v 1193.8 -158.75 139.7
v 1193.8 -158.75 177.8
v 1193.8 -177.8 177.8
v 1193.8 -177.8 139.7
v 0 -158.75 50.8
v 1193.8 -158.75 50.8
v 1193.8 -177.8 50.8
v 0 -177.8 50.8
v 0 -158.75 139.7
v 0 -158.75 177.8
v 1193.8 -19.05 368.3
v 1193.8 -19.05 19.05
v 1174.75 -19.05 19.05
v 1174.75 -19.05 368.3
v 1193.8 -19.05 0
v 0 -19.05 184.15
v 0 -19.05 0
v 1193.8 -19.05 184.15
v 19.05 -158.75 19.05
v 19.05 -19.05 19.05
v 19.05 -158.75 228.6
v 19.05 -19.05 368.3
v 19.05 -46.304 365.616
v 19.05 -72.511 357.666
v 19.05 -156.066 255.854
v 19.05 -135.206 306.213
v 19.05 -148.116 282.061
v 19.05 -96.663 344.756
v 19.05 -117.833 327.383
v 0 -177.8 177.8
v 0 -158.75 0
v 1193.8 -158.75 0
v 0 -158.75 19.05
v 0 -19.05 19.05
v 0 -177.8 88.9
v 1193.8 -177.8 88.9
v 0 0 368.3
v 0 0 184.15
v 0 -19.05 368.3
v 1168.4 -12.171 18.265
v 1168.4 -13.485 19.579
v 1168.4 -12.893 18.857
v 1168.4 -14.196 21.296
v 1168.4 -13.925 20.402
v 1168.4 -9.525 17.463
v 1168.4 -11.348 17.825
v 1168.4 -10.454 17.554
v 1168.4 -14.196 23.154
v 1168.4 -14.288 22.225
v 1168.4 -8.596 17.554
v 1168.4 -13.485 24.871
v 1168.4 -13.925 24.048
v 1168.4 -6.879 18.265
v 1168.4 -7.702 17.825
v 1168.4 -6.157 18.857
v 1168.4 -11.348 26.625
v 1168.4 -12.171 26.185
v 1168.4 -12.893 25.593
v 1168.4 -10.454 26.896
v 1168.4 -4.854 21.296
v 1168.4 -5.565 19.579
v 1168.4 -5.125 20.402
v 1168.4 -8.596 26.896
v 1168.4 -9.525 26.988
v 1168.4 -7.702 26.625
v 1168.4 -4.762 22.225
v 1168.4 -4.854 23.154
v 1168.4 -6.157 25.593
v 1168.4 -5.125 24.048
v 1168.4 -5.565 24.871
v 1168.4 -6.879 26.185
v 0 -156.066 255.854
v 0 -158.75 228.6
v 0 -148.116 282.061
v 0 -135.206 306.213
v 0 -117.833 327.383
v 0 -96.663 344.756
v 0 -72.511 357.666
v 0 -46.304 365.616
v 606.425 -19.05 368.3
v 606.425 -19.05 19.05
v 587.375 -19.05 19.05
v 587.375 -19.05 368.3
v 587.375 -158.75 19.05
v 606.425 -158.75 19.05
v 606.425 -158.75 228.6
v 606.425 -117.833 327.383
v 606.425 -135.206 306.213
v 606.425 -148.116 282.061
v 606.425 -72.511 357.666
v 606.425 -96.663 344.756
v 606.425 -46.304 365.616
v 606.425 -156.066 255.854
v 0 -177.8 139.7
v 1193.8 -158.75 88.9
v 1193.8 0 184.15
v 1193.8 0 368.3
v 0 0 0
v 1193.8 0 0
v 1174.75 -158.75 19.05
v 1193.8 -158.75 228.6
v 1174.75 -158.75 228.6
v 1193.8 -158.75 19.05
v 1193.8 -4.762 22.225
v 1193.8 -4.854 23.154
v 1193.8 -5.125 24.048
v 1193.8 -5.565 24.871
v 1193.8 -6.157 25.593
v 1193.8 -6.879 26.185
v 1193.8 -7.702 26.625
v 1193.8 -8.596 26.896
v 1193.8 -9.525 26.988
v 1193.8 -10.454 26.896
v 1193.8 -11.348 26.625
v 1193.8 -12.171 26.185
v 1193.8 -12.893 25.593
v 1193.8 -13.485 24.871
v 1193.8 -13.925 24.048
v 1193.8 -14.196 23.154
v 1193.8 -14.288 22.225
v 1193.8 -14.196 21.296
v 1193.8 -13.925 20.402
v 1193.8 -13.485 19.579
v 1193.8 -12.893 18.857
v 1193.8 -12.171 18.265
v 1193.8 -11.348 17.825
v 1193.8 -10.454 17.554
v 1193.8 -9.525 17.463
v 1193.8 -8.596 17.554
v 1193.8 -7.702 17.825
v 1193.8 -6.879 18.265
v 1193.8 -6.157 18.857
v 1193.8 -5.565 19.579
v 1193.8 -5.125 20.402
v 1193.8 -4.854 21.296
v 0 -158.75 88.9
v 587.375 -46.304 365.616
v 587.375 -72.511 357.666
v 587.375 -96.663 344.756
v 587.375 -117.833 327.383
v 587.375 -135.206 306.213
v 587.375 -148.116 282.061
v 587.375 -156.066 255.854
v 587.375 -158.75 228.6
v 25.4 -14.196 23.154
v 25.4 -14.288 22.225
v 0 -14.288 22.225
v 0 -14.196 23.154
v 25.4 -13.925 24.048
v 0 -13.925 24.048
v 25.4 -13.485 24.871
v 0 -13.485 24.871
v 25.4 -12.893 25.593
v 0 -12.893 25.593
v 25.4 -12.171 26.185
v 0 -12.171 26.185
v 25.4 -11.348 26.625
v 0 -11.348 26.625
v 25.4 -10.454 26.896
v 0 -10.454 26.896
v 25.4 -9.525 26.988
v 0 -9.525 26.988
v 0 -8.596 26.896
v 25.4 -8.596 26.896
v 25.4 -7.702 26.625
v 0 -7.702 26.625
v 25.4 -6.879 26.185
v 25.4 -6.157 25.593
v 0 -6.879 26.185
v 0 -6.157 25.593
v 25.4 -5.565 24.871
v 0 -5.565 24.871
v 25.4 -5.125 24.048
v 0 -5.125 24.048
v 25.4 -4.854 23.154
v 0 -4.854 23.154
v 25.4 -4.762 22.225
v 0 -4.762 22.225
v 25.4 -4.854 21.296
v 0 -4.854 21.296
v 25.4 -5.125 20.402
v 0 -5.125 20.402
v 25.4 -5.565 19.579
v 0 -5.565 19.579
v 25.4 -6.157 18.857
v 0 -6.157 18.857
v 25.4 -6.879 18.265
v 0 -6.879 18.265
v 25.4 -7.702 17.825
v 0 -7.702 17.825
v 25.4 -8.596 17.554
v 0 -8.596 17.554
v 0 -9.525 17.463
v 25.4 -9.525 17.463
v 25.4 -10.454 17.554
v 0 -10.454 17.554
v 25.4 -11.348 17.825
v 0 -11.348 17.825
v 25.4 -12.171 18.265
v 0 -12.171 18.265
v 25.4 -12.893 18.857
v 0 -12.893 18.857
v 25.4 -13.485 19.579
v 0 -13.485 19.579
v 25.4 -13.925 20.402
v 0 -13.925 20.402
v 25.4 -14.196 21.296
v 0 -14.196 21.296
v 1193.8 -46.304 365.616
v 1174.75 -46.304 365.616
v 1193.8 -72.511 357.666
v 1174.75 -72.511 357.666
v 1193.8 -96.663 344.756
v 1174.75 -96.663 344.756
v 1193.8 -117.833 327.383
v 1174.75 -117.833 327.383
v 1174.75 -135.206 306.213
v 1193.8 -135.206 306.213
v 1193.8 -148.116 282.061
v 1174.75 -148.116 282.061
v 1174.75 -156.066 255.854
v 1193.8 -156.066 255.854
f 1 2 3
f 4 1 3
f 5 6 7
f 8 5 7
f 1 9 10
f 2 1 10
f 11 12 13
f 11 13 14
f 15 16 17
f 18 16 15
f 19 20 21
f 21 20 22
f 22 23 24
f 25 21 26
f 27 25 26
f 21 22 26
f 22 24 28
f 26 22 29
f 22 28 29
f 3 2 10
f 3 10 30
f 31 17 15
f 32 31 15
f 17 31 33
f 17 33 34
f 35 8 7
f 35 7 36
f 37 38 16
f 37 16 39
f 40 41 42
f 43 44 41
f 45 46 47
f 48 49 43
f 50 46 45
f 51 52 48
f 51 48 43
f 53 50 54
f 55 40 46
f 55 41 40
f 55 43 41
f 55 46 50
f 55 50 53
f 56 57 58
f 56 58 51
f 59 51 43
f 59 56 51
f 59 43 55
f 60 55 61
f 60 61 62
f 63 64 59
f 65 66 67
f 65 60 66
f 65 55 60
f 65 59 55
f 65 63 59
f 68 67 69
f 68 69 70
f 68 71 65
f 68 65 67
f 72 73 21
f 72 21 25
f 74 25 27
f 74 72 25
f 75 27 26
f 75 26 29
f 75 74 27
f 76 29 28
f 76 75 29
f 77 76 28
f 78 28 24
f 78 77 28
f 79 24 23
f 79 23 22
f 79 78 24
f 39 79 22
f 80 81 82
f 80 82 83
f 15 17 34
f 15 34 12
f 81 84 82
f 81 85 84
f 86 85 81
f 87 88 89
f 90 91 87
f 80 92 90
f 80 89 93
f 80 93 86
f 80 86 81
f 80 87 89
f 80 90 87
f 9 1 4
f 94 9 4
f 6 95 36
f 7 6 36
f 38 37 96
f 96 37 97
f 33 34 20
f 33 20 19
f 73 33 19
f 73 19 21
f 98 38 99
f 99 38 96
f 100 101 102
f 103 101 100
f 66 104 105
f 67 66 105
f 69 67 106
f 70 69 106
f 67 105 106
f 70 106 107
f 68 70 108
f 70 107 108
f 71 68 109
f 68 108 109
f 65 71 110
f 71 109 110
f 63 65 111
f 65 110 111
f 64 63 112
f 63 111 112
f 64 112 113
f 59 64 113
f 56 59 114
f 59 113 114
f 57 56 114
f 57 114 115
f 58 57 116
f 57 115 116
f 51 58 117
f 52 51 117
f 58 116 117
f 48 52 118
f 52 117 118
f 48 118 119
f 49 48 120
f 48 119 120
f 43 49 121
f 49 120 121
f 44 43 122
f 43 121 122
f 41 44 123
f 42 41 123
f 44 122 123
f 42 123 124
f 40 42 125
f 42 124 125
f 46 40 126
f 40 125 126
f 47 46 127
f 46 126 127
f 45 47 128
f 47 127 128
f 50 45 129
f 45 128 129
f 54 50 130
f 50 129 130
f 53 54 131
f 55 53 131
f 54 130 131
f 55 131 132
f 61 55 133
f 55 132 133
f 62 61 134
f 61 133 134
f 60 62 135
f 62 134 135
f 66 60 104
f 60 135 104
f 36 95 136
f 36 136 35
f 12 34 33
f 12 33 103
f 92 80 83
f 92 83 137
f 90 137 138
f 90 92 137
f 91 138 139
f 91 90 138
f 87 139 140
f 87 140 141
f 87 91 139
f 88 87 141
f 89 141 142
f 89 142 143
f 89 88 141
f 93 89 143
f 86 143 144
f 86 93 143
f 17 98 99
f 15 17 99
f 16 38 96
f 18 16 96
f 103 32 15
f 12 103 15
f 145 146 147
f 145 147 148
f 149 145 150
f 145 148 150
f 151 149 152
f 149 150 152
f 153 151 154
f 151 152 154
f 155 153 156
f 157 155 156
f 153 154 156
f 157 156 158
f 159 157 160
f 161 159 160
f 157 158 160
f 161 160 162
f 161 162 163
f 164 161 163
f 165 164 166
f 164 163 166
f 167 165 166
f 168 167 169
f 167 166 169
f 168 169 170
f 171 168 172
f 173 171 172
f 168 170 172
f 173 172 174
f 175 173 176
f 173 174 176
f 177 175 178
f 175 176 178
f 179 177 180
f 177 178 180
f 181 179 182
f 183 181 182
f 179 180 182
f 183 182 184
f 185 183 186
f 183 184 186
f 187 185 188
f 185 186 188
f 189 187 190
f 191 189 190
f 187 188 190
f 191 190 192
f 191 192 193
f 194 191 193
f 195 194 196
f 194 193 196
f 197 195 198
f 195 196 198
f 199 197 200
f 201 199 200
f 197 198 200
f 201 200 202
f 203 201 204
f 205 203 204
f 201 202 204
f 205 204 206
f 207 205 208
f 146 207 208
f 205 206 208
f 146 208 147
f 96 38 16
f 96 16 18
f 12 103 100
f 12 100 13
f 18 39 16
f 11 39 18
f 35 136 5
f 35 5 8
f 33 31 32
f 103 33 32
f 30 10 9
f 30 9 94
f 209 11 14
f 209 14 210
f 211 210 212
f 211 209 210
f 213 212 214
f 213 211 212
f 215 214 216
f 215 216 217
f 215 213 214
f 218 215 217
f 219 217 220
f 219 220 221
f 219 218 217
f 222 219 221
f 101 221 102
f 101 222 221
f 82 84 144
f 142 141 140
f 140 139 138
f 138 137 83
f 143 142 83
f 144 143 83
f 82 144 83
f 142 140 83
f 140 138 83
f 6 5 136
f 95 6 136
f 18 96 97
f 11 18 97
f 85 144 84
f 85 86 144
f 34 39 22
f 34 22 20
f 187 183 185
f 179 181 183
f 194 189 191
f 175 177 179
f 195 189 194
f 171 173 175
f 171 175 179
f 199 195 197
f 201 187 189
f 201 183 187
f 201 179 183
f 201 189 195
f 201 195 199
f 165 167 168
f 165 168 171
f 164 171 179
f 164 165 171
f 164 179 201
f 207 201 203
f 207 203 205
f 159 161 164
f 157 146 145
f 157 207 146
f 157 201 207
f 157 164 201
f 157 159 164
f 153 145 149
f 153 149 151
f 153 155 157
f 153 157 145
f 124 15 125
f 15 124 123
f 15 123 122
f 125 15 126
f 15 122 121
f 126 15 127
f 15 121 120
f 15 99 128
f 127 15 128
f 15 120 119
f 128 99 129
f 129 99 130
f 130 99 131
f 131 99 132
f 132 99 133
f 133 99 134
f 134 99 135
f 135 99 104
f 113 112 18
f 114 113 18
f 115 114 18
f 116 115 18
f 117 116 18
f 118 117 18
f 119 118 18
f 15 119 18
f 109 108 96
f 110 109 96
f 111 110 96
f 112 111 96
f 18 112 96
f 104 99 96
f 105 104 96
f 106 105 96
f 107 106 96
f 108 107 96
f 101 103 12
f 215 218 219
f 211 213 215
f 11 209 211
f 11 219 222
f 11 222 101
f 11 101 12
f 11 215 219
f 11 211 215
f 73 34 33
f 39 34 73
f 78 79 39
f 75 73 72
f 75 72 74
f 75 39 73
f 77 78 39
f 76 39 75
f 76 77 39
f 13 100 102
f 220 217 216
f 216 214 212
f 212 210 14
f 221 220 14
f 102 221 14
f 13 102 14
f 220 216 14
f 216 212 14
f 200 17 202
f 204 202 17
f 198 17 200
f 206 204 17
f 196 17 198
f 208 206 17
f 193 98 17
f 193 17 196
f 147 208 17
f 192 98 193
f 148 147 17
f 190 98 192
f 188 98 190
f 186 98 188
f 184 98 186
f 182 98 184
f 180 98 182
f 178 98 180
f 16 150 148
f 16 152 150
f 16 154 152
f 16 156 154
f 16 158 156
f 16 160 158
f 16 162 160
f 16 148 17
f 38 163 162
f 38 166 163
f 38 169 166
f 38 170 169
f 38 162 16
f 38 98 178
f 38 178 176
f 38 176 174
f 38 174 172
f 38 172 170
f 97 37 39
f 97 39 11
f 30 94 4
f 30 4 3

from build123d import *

# Parameters (mm, degrees)
F0_W      = 1193.8
F0_H      = 184.15
F1_DEPTH  = 19.05
F2_W      = 1193.8
F2_H      = 184.15
F3_DEPTH  = 19.05
F4_W      = 1193.8
F4_H      = 139.7
F5_DEPTH  = 19.05
F7_DEPTH  = 19.05
F9_DEPTH  = 19.05
F13_DEPTH = 9.525
F14_W     = 19.05
F14_H     = 38.1
F15_DEPTH = 1193.8
F16_W     = 19.05
F16_H     = 38.1
F17_DEPTH = 1193.8
F18_R     = 4.7625
F19_DEPTH = 25.4
F20_R     = 4.7625
F21_DEPTH = 25.4


with BuildPart() as f1:
    # F0 (on Front) → F1 (new body)
    with BuildSketch(Plane.XZ):
        with Locations((596.9, 92.075)):
            Rectangle(F0_W, F0_H)
    extrude(amount=F1_DEPTH)

    # F18 (on face) → F19 (cut)
    with BuildSketch(Plane.YZ.offset(1193.8)):
        with Locations((-9.525, 22.225)):
            Circle(F18_R)
    extrude(amount=-F19_DEPTH, mode=Mode.SUBTRACT)

    # F20 (on face) → F21 (cut)
    with BuildSketch(Plane(origin=(0, 0, 0), x_dir=(0, -1, 0), z_dir=(-1, 0, 0))):
        with Locations((9.525, 22.225)):
            Circle(F20_R)
    extrude(amount=-F21_DEPTH, mode=Mode.SUBTRACT)


with BuildPart() as f3:
    # F2 (on Front) → F3 (new body)
    with BuildSketch(Plane.XZ):
        with Locations((596.9, 276.225)):
            Rectangle(F2_W, F2_H)
    extrude(amount=F3_DEPTH)


with BuildPart() as f5:
    # F4 (on Top) → F5 (new body)
    with BuildSketch(Plane.XY):
        with Locations((596.9, -88.9)):
            Rectangle(F4_W, F4_H)
    extrude(amount=F5_DEPTH)


with BuildPart() as f7:
    # F6 (on face) → F7 (new body)
    with BuildSketch(Plane(origin=(0, 0, 0), x_dir=(0, -1, 0), z_dir=(-1, 0, 0))):
        with BuildLine():
            Line((19.05, 368.3), (19.05, 19.05))
            Line((19.05, 19.05), (158.75, 19.05))
            Line((158.75, 19.05), (158.75, 228.6))
            ThreePointArc((158.75, 228.6), (117.8328173318, 327.3828173318), (19.05, 368.3))
        make_face()
    extrude(amount=-F7_DEPTH)


with BuildPart() as f9:
    # F8 (on face) → F9 (new body)
    with BuildSketch(Plane.YZ.offset(1193.8)):
        with BuildLine():
            Line((-158.75, 228.6), (-158.75, 19.05))
            Line((-158.75, 19.05), (-19.05, 19.05))
            Line((-19.05, 19.05), (-19.05, 368.3))
            ThreePointArc((-19.05, 368.3), (-117.8328173318, 327.3828173318), (-158.75, 228.6))
        make_face()
    extrude(amount=-F9_DEPTH)


with BuildPart() as f13:
    # F12 (on plane+point) → F13 (new body, symmetric)
    with BuildSketch(Plane.YZ.offset(596.9)):
        with BuildLine():
            Line((-158.75, 19.05), (-19.05, 19.05))
            Line((-19.05, 19.05), (-19.05, 368.3))
            ThreePointArc((-19.05, 368.3), (-117.8328173318, 327.3828173318), (-158.75, 228.6))
            Line((-158.75, 228.6), (-158.75, 19.05))
        make_face()
    extrude(amount=F13_DEPTH, both=True)


with BuildPart() as f15:
    # F14 (on face) → F15 (new body, through all)
    with BuildSketch(Plane(origin=(0, 0, 0), x_dir=(0, -1, 0), z_dir=(-1, 0, 0))):
        with Locations((168.275, 69.85)):
            Rectangle(F14_W, F14_H)
    extrude(amount=-F15_DEPTH)


with BuildPart() as f17:
    # F16 (on face) → F17 (new body, through all)
    with BuildSketch(Plane(origin=(0, 0, 0), x_dir=(0, -1, 0), z_dir=(-1, 0, 0))):
        with Locations((168.275, 158.75)):
            Rectangle(F16_W, F16_H)
    extrude(amount=-F17_DEPTH)


solid = Compound([f1.part, f3.part, f5.part, f7.part, f9.part, f13.part, f15.part, f17.part])
